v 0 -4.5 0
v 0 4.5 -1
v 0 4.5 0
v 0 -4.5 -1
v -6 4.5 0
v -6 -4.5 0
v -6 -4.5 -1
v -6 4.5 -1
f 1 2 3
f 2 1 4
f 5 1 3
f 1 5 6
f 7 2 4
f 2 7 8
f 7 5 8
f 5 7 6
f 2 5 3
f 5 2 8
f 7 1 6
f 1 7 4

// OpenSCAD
// file: Constants.scad
$fn=100;

TEXT_FONT = "Arial Rounded MT Bold";
RPM_VERSION_STRING="BigBrain RPM v2";

ARM_TOLERANCE=.5;
ARM_DIAMETER=6;
ARM_THICKNESS=ARM_DIAMETER-2;
ARM_LENGTH=52;
AXLE_INNER_DIAMETER = 2.5;

TACK_HOUSING_DEPTH = 5.5;
TACK_HOUSING_WIDTH = 14;
TACK_HOUSING_HEIGHT = 14;
TACK_PIN_DIAMETER = 1.5;
KNOCKOFF_LENGTH=TACK_HOUSING_WIDTH/2;
WIPER_HEIGHT=4.5;

// Used to show the peg channel as a cut-through
DEBUG_PEG_CHANNEL = false;

PEG_DIAMETER=2;
PEG_HEIGHT=2.5;
PEG_TOLERANCE=.25;
PEG_TRACK_DEPTH=(ARM_DIAMETER+PEG_HEIGHT) * (DEBUG_PEG_CHANNEL ? 2 : 1);
PEG_CHANNEL_WIDTH=PEG_DIAMETER+PEG_TOLERANCE;
PEG_CHANNEL_PADDING=1;

// outer cylinder w/ track
ROTATION_LENGTH=12;
ROTATION_STEP=.75;
RECEIVE_LENGTH=TACK_HOUSING_WIDTH/2;

SLEEVE_LENGTH=KNOCKOFF_LENGTH+ROTATION_LENGTH+RECEIVE_LENGTH+PEG_CHANNEL_PADDING*2;
SLEEVE_HOUSING_LENGTH=SLEEVE_LENGTH;
SLEEVE_DIAMETER=ARM_DIAMETER+PEG_HEIGHT*2+PEG_CHANNEL_PADDING;
END_CAP_THREAD_LENGTH=2;
END_CAP_PADDING=1;
CUTTER_WIDTH=2;
CUTTER_INSERT_LENGTH=6;

module horizontalSlice(where=1) {
    difference() {
        children();
        translate([0,0,500+where])
        cube([1000,1000,1000], center=true);
    }
}
// main file
include <Constants.scad>

PART_VERSION_STRING="v2.0";

module cutter(width,height,depth) {
  CutterPoints=[
    [0,0,0], // 1
    [width,0,0], // 2
    [width,depth,0], // 3
    [0,depth,0], // 4
    [0,0,height-height*sin(15)], // 5
    [width,0,height], // 6
    [width,depth,height-depth*cos(30)], // 7
    [0,depth,height-depth*cos(30)-height*sin(15)] // 8
  ];
  CutterFaces=[
    [0,1,2,3],
    [4,5,6,7],
    [0,1,5,4],
    [1,2,6,5],
    [2,3,7,6],
    [0,3,7,4]
  ];
  union() {
    translate([-width/2,-depth/2,0])
      polyhedron(CutterPoints, CutterFaces);

    blade_insert_tolerance = 0;
    translate([-blade_insert_tolerance,-depth*.75/2,-CUTTER_INSERT_LENGTH])
      cube([width/2+blade_insert_tolerance,depth*.75,CUTTER_INSERT_LENGTH]);
   
  }
}

module blade() {
//  translate([CUTTER_WIDTH*2,0,CUTTER_WIDTH/2])
    difference() {
        rotate([0,90,0])
        cutter(CUTTER_WIDTH,TACK_HOUSING_HEIGHT,SLEEVE_DIAMETER);
        translate([1,0,-.5])
        rotate([180,0,90])
        linear_extrude(.5) text(PART_VERSION_STRING, font=TEXT_FONT, size=3, halign="center", valign="middle");
    }
}
blade();
